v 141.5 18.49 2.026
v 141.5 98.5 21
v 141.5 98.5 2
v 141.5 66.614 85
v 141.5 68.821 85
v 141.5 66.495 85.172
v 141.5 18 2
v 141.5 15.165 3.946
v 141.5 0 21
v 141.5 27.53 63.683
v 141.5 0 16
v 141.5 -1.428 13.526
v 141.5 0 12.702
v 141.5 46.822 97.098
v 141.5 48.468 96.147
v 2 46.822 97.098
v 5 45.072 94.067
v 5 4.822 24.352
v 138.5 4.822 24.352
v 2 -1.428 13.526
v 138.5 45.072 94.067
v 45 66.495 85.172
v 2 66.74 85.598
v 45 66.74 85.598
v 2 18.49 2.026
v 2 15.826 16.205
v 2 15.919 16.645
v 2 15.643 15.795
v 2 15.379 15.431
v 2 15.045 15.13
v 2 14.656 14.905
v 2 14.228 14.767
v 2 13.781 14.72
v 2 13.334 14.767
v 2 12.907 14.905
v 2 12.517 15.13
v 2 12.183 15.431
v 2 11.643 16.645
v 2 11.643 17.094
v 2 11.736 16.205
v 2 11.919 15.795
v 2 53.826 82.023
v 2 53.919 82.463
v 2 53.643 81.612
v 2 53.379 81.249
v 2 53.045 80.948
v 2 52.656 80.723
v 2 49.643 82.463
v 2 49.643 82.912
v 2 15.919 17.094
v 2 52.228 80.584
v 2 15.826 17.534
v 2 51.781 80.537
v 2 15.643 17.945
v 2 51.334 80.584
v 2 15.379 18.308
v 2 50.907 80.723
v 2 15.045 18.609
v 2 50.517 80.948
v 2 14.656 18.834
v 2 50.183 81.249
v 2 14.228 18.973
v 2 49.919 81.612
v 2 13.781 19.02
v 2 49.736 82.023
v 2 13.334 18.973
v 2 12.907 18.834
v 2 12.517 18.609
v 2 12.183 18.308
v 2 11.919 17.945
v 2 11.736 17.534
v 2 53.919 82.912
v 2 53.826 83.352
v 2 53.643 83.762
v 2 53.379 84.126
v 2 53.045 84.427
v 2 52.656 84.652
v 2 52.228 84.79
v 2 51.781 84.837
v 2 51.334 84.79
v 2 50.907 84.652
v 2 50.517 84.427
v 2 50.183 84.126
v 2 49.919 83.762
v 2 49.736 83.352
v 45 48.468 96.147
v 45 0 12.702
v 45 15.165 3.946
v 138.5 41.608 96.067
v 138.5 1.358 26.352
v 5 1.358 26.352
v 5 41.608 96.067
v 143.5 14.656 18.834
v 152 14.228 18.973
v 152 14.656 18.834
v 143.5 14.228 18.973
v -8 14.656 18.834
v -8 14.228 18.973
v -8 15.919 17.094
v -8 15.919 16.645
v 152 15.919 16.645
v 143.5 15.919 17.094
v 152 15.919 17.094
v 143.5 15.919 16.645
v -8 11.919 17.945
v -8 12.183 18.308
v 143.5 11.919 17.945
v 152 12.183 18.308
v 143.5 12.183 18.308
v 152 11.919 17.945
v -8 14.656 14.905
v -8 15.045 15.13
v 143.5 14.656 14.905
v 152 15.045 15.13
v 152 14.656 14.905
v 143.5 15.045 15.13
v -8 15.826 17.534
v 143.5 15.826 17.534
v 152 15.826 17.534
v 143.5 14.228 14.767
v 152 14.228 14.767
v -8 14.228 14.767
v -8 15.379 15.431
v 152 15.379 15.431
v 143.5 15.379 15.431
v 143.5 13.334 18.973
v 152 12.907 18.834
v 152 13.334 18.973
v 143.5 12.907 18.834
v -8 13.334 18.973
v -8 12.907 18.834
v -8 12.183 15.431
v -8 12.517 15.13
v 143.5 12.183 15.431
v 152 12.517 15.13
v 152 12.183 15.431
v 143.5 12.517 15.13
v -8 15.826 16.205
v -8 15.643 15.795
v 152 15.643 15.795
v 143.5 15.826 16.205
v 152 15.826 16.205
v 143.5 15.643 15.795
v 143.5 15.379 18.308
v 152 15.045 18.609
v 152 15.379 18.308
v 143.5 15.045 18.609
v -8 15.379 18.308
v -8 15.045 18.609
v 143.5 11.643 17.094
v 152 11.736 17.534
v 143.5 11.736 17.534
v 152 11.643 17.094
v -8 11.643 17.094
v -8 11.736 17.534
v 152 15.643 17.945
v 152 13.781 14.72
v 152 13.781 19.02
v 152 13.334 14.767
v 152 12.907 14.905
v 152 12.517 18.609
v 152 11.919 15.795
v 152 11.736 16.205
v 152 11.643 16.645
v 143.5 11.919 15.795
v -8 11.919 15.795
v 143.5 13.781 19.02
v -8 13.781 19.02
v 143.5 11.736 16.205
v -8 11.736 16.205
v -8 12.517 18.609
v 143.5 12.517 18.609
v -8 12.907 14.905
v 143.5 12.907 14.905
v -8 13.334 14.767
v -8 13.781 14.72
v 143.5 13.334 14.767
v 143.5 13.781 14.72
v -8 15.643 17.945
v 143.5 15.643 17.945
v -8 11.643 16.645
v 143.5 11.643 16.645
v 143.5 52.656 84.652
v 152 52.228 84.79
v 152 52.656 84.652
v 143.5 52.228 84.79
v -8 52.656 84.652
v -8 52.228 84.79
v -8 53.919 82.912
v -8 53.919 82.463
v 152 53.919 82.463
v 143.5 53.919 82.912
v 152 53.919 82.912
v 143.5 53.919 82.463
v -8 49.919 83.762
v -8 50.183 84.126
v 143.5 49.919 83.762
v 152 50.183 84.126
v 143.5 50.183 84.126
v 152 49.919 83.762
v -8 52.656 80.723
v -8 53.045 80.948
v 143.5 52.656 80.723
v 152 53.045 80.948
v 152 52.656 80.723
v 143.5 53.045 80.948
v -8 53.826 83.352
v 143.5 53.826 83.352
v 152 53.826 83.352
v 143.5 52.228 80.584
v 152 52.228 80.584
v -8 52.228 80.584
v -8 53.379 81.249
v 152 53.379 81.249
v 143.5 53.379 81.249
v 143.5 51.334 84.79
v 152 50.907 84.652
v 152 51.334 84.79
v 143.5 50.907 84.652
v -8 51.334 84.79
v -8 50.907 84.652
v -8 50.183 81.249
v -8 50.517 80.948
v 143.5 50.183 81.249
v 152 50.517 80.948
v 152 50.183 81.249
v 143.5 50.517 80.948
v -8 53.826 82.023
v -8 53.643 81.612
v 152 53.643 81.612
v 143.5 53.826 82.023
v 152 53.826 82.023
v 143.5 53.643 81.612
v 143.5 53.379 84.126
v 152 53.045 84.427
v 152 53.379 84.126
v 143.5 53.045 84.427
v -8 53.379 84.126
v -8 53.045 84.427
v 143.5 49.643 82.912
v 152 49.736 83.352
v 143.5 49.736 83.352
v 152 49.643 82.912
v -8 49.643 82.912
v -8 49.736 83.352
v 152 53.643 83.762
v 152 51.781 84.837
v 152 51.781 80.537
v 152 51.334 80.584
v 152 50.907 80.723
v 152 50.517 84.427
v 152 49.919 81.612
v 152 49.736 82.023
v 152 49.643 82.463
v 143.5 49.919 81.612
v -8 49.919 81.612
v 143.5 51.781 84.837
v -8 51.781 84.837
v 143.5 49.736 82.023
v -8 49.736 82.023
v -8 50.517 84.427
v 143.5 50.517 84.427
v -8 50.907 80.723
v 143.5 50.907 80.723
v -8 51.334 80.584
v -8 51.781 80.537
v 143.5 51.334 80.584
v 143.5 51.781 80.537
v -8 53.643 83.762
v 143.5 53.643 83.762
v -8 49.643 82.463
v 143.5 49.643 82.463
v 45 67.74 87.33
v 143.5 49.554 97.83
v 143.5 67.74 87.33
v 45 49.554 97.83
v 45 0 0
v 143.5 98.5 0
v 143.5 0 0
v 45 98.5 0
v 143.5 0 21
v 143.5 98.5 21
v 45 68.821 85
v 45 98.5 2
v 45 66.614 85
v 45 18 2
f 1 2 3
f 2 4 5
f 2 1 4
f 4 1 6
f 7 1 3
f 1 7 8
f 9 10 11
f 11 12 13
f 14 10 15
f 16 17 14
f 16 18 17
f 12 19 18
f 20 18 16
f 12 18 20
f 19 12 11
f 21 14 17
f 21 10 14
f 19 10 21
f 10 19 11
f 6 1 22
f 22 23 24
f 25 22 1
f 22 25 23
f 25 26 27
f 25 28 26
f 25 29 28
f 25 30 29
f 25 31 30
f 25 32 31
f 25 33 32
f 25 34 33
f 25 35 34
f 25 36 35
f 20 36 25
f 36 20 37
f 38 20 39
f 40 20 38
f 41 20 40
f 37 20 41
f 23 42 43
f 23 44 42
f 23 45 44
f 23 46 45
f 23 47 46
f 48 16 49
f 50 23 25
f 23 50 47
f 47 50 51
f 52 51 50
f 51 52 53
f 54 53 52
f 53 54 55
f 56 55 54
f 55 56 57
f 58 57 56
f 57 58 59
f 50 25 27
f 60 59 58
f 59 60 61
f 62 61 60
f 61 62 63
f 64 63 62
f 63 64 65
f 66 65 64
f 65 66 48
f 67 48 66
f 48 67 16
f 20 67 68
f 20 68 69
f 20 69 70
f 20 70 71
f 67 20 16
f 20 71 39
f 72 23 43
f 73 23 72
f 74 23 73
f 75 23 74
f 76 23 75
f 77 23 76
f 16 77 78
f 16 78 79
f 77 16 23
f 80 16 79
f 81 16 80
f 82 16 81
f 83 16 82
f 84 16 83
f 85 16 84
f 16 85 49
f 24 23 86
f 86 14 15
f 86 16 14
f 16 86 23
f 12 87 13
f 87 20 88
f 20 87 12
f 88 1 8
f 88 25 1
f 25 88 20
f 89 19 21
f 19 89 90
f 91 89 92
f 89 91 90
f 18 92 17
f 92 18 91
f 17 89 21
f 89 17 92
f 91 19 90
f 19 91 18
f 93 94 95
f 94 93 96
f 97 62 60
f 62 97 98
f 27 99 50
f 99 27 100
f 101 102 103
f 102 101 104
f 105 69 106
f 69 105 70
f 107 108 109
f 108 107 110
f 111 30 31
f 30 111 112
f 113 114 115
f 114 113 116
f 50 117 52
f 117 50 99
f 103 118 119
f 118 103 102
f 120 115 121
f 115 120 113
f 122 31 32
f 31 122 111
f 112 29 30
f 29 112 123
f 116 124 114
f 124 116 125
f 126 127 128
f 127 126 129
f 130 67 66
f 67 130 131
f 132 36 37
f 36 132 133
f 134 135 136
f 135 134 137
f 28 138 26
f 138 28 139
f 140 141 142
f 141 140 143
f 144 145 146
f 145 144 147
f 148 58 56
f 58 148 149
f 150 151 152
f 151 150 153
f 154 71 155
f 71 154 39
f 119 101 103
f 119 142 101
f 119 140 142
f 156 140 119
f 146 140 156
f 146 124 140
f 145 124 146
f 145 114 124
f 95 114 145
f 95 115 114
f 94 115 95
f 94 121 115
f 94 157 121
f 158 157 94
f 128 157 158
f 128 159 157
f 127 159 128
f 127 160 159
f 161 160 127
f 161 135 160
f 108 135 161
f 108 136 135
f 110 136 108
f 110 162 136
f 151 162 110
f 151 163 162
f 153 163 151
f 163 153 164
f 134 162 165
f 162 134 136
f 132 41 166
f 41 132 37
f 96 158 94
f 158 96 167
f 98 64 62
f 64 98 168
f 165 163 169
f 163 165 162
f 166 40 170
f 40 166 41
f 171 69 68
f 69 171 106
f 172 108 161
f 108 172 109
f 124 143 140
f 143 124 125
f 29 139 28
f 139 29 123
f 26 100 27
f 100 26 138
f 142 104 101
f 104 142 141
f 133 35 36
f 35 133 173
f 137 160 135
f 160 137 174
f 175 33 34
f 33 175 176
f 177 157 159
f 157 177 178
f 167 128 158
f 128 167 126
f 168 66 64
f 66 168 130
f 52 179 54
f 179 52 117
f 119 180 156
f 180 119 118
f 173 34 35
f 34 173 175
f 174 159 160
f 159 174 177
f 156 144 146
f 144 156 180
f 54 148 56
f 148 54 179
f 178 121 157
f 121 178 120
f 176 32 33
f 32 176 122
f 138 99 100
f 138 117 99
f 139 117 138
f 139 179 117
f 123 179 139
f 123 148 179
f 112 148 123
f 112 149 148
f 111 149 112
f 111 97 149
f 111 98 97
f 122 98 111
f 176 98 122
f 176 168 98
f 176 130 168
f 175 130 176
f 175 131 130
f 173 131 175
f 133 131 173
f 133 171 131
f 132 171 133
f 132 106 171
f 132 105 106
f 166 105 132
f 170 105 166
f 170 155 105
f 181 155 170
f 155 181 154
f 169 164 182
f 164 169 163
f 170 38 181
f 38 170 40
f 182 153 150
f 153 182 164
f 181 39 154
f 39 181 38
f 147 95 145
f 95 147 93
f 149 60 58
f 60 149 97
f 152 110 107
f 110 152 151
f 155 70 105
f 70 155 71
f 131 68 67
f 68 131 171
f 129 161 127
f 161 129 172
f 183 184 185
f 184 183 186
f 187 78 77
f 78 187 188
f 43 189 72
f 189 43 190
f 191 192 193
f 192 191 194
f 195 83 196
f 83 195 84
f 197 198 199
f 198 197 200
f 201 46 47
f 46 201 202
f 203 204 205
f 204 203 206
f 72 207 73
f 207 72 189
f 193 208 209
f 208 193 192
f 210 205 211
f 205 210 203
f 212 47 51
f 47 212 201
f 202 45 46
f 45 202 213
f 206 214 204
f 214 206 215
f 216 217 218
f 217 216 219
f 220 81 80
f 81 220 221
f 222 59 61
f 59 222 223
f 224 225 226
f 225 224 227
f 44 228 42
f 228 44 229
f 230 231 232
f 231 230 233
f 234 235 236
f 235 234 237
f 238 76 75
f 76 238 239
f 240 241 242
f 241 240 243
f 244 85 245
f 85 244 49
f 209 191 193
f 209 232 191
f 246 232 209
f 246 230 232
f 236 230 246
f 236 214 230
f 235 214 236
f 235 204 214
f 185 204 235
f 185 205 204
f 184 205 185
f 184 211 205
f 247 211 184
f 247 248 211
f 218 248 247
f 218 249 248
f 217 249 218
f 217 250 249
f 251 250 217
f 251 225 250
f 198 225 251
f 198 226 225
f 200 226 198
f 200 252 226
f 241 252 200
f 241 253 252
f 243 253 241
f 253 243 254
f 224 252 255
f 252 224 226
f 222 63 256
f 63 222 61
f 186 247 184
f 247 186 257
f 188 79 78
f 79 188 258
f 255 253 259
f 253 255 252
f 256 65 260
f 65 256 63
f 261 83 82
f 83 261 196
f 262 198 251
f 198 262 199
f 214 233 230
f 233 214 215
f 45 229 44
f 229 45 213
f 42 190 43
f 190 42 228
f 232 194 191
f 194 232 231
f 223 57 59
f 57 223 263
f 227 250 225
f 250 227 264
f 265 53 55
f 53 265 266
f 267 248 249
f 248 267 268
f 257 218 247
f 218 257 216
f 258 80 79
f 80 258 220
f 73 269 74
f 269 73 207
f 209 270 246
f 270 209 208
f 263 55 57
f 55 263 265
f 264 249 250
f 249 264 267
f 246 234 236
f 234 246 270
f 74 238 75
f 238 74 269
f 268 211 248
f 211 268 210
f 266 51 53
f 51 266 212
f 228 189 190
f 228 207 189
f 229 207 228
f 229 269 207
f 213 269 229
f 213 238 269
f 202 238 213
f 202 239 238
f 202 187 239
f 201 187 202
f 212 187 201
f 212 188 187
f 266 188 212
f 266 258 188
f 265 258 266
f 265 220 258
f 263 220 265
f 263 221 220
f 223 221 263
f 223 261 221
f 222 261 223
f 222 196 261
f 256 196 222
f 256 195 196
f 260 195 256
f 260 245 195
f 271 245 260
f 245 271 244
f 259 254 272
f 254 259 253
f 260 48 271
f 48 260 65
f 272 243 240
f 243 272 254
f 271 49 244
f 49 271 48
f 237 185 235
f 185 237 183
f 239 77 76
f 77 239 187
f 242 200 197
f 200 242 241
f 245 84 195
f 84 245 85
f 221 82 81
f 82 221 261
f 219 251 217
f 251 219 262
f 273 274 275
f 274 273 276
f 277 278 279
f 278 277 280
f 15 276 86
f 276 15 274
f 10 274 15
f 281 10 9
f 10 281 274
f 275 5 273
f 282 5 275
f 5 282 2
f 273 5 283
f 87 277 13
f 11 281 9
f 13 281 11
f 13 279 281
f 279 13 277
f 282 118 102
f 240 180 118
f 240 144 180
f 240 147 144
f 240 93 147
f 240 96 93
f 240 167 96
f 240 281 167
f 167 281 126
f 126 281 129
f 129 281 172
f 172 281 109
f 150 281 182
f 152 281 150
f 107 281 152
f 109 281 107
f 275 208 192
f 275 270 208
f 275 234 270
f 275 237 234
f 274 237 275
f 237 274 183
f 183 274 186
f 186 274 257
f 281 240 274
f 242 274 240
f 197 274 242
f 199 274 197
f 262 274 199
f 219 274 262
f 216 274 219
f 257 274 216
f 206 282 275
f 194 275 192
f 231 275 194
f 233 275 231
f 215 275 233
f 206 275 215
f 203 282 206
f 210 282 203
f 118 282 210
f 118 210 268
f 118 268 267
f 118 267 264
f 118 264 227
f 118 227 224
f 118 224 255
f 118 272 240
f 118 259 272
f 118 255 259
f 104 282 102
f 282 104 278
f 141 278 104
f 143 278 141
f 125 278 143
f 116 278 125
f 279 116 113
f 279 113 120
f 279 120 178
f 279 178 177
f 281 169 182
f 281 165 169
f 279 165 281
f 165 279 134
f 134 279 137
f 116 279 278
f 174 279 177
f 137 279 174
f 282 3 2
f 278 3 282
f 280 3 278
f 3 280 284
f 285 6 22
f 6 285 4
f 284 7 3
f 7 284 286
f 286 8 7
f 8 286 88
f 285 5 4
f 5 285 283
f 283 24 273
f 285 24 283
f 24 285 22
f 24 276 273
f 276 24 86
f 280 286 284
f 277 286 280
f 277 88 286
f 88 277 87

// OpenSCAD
// file: ../parameters.scad
maximum_printable_size = 150;

layer_thickness = 0.3;
global_clearance = 0.5;

platform_base_diameter = 400; // Průměr ukotvení válců spodní platformy
platform_base_thickness = 20;
platform_cylinder_medium_length = 250;  // délka pneumatického válce s pístem vysunutým do poloviny rozsahu
platform_base_cylinder_spacing = 38;    //rozestupy spodního a horního ukotvení válců.
platform_top_cylinder_spacing = 30;
platform_top_diameter = 150;   // Průměr horní základny (vdálenost od středu základny do středu kulového kloubu ke kterému je uchycen pneumatický válec)


// screw length step - minimum difference in length between two types of screws
basic_screw_length = 5;

carbon_pipe_10_outer_diameter = 10.4;


//Screw diameter and nut for M10 [mm]
M10_screw_diameter = 10.4;
M10_head_height = 10;
M10_head_diameter = 16+0.5;
M10_nut_height = 10.5;
M10_nut_diameter = 25.5;
M10_nut_pocket = 22.3;

//Screw diameter for M8 [mm]
M8_screw_diameter = 8.6;
M8_head_height = 8;
M8_head_diameter = 13.5;
M8_nut_height = 7.5;
M8_square_nut_thin_height = 4.5;
M8_nut_diameter = 14.4 + 0.5;
M8_nut_pocket = 13 + 0.5;
M8_washer_diameter = 16;
M8_washer_thickness = 1.5;


//Screw diameter and nut for M6 [mm]
M6_screw_diameter=6.5;
M6_head_diameter = 10+0.5;
M6_head_height = 6;
M6_nut_height = 4.9;
M6_nut_diameter = 11.8;
M6_nut_pocket = 10.4;
M6_square_nut_height = 3;
M6_square_nut_diameter = 10;

//Screw diameter and nut for M5 [mm]
M5_screw_diameter=5.5;
M5_head_height = 5;
M5_head_diameter = 13+0.5;
M5_nut_height = 4.5;
M5_nut_diameter = 9.4;
M5_nut_pocket = 8.4;

//Screw diameter and nut for M4 [mm]
M4_screw_diameter=4.5;
M4_screw_head_height = 4;
M4_nut_height = 3.2;
M4_nut_diameter = 8.4;
M4_nut_pocket = 7.5;

//Screw diameter and nut for M3 [mm]
M3_screw_diameter = 3.2;
M3_nut_height = 2.7;
M3_nut_diameter = 6.6;
M3_nut_pocket = 5.6;
M3_screw_head_height = 3;

//Screw diameter and nut for M2,5 [mm]
M2_5_screw_diameter = 2.7;
M2_5_nut_height = 2.3;
M2_5_nut_diameter = 6;
M2_5_nut_pocket = 5.5;

// kulove lozisko

bearing_efsm_08_h = 33+1;
bearing_efsm_08_m = 22;
bearing_efsm_08_db = 18;
bearing_efsm_08_ag = 10.5;
bearing_efsm_08_n = M4_screw_diameter;
bearing_efsm_08_a1 = 5.5;
bearing_efsm_08_d = 8.25;
bearing_efsm_08_B = 8; // ball height

bearing_efsm_10_h = 38+1;
bearing_efsm_10_m = 26;
bearing_efsm_10_db = 21.9;
bearing_efsm_10_ag = 12+0.2;
bearing_efsm_10_n = M5_screw_diameter;
bearing_efsm_10_a1 = 6.5;
bearing_efsm_10_d = 10.25;


bearing_efsm_12_width = 40+1;
bearing_efsm_12_h = bearing_efsm_12_width;
bearing_efsm_12_boltd = 28/2; // polovina vzdalenosti mezi srouby
bearing_efsm_12_m = bearing_efsm_12_boltd*2;
bearing_efsm_12_db = 25;
bearing_efsm_12_ag = 13;
bearing_efsm_12_a1 = 7;
bearing_efsm_12_n = M5_screw_diameter;
bearing_efsm_12_d = 12.15;
bearing_efsm_12_B = 10; // ball height
bearing_efsm_space = 1;

bearing_efsm_17_width = 54+1;
bearing_efsm_17_h = bearing_efsm_17_width;
bearing_efsm_17_boltd = 38/2; // polovina vzdalenosti mezi srouby
bearing_efsm_17_m = bearing_efsm_17_boltd*2;
bearing_efsm_17_db = 35;
bearing_efsm_17_ag = 18;
bearing_efsm_17_n = M6_screw_diameter;
bearing_efsm_17_a1 = 10;
bearing_efsm_17_B = 17; // ball height

//limcove lozisko
bearing_EFOM_10_L=26; //celkova sirka zakladny
bearing_EFOM_10_d1=10.3;//diametr otvoru real=10 mm
bearing_EFOM_10_dB=22;//diametr vystupku pro ulozeni lozika
bearing_EFOM_10_H=52;//celková delka zakladny
bearing_EFOM_10_J=36;// hole pitch
bearing_EFOM_10_A1=6.5;//vyska pouzdra
bearing_EFOM_10_Ag=12;//celkova vyska
bearing_EFOM_10_N1=5;//sirka otvoru pro sroub
bearing_EFOM_10_N2=8;//delka otvoru pro sroub
bearing_EFOM_10_m=36;//roztec der pro sroub
bearing_EFOM_10_h=9;//vyska lozika


608_bearing_outer_diameter = 22.3;
608_bearing_inner_diameter = 16;
608_bearing_thickness = 7.1;


// 20 KG servo parameters

servo_20kg_axis_offset = 9.375; // jak je osa mimo stredu
servo_20kg_body_x = 42;
servo_20kg_body_y = 21;
servo_20kg_body_z = 40;
servo_20kg_thread_x = 49/2;
servo_20kg_thread_y = 10/2;
servo_20kg_body_below = 10; // jak hluboko je tělo serva pod drzaky na srouby
servo_20kg_below = 25.8; // jak hluboko je páka serva pod drzaky na srouby

servo_20kg_bolt_d = 2.5+0.3;
servo_20kg_nut_d = 5+0.3;


//strain gauge
strain_gauge_width = 12.7;
strain_gauge_length = 75.1;
strain_gauge_screw_distance = 10;

//ALU profile
ALU_profile_width = 30.3;
ALU_profile_holder_wall_thickness = 3;
ALU_profile_groove_width = 8;

//pillow block bearing
//https://www.igus.eu/product/372
//Part no. KSTM-08
KSTM08_screws_distance = 33;         //m
KSTM08_screws_holes_diameter = 4.5;  //d2
KSTM08_flange_thickness = 6;         //h3
KSTM08_case_width = 9;               //C1
KSTM08_case_length = 47;             //a
KSTM08_ball_width = 12;              //B


//ložiska pro malý rotor
bearing_outer_diameter = 10.2;    // Rozměr B1 v nákresu s přídavkem na toleranci otvoru
bearing_thickness = 4;        // Rozměr B2 v nákresu
//bearing_shaft_length = 19.5;    // Rozměr B3 v nákresu, Originalni hodnota 19.5
bearing_shaft_length = 20;    // Rozměr B3 v nákresu


//parametry víčka s telemetrickou anténou
S01_sila_materialu=1.2;
S01_vyska_horni_zavit=10;
S01_hloubka_zavitu=4;
S01_prumer_vnitrni=50;
LO_spodni_prumer=17.2;
LO_vyska_bez_krytu=15;
S01_tolerance_zavit=1.5;
R01_vyska_prekryti_statoru=10;
// main file
include <../parameters.scad>


module reTerminal() {
	cube([139.5, 96.5, 23]);

	translate([(139.5-133.5)/2, 12.5, 22])
	cube([133.5, 80.5, 5]);
	
	translate([-10, 10.5, 23/2])
	rotate([0, 90, 0])
	cylinder(d=4.3, h=160, $fn=30);
	
	translate([-10, 10.5+76, 23/2])
	rotate([0, 90, 0])
	cylinder(d=4.3, h=160, $fn=30);
}

module reTerminal_holder() {
	difference() {
		hull() {
			rotate([60, 0, 0])
			translate([0, 11, -15])
			cube([139.5+4, 96.5+2, 21]);

			cube([139.5+4, 96.5+2, 21]);
		}

		translate([2, 0, 2])
		hull() {
			rotate([60, 0, 0])
			translate([0, 11, -15])
			cube([139.5, 96.5-1.75, 25]);

			translate([0, 18, 0])
			cube([139.5, 96.5-5, 21]);
		}

		translate([2, 50, 20])
		cube([139.5, 90, 65]);

		rotate([60, 0, 0])
		translate([2, 11, -15])
		reTerminal();
	}
}


rotate([60, 0, 0])
translate([2, 11, -15])
#reTerminal();

difference() {
reTerminal_holder();
translate([-5, -5, -5])
cube([50, 150, 150]);
}
